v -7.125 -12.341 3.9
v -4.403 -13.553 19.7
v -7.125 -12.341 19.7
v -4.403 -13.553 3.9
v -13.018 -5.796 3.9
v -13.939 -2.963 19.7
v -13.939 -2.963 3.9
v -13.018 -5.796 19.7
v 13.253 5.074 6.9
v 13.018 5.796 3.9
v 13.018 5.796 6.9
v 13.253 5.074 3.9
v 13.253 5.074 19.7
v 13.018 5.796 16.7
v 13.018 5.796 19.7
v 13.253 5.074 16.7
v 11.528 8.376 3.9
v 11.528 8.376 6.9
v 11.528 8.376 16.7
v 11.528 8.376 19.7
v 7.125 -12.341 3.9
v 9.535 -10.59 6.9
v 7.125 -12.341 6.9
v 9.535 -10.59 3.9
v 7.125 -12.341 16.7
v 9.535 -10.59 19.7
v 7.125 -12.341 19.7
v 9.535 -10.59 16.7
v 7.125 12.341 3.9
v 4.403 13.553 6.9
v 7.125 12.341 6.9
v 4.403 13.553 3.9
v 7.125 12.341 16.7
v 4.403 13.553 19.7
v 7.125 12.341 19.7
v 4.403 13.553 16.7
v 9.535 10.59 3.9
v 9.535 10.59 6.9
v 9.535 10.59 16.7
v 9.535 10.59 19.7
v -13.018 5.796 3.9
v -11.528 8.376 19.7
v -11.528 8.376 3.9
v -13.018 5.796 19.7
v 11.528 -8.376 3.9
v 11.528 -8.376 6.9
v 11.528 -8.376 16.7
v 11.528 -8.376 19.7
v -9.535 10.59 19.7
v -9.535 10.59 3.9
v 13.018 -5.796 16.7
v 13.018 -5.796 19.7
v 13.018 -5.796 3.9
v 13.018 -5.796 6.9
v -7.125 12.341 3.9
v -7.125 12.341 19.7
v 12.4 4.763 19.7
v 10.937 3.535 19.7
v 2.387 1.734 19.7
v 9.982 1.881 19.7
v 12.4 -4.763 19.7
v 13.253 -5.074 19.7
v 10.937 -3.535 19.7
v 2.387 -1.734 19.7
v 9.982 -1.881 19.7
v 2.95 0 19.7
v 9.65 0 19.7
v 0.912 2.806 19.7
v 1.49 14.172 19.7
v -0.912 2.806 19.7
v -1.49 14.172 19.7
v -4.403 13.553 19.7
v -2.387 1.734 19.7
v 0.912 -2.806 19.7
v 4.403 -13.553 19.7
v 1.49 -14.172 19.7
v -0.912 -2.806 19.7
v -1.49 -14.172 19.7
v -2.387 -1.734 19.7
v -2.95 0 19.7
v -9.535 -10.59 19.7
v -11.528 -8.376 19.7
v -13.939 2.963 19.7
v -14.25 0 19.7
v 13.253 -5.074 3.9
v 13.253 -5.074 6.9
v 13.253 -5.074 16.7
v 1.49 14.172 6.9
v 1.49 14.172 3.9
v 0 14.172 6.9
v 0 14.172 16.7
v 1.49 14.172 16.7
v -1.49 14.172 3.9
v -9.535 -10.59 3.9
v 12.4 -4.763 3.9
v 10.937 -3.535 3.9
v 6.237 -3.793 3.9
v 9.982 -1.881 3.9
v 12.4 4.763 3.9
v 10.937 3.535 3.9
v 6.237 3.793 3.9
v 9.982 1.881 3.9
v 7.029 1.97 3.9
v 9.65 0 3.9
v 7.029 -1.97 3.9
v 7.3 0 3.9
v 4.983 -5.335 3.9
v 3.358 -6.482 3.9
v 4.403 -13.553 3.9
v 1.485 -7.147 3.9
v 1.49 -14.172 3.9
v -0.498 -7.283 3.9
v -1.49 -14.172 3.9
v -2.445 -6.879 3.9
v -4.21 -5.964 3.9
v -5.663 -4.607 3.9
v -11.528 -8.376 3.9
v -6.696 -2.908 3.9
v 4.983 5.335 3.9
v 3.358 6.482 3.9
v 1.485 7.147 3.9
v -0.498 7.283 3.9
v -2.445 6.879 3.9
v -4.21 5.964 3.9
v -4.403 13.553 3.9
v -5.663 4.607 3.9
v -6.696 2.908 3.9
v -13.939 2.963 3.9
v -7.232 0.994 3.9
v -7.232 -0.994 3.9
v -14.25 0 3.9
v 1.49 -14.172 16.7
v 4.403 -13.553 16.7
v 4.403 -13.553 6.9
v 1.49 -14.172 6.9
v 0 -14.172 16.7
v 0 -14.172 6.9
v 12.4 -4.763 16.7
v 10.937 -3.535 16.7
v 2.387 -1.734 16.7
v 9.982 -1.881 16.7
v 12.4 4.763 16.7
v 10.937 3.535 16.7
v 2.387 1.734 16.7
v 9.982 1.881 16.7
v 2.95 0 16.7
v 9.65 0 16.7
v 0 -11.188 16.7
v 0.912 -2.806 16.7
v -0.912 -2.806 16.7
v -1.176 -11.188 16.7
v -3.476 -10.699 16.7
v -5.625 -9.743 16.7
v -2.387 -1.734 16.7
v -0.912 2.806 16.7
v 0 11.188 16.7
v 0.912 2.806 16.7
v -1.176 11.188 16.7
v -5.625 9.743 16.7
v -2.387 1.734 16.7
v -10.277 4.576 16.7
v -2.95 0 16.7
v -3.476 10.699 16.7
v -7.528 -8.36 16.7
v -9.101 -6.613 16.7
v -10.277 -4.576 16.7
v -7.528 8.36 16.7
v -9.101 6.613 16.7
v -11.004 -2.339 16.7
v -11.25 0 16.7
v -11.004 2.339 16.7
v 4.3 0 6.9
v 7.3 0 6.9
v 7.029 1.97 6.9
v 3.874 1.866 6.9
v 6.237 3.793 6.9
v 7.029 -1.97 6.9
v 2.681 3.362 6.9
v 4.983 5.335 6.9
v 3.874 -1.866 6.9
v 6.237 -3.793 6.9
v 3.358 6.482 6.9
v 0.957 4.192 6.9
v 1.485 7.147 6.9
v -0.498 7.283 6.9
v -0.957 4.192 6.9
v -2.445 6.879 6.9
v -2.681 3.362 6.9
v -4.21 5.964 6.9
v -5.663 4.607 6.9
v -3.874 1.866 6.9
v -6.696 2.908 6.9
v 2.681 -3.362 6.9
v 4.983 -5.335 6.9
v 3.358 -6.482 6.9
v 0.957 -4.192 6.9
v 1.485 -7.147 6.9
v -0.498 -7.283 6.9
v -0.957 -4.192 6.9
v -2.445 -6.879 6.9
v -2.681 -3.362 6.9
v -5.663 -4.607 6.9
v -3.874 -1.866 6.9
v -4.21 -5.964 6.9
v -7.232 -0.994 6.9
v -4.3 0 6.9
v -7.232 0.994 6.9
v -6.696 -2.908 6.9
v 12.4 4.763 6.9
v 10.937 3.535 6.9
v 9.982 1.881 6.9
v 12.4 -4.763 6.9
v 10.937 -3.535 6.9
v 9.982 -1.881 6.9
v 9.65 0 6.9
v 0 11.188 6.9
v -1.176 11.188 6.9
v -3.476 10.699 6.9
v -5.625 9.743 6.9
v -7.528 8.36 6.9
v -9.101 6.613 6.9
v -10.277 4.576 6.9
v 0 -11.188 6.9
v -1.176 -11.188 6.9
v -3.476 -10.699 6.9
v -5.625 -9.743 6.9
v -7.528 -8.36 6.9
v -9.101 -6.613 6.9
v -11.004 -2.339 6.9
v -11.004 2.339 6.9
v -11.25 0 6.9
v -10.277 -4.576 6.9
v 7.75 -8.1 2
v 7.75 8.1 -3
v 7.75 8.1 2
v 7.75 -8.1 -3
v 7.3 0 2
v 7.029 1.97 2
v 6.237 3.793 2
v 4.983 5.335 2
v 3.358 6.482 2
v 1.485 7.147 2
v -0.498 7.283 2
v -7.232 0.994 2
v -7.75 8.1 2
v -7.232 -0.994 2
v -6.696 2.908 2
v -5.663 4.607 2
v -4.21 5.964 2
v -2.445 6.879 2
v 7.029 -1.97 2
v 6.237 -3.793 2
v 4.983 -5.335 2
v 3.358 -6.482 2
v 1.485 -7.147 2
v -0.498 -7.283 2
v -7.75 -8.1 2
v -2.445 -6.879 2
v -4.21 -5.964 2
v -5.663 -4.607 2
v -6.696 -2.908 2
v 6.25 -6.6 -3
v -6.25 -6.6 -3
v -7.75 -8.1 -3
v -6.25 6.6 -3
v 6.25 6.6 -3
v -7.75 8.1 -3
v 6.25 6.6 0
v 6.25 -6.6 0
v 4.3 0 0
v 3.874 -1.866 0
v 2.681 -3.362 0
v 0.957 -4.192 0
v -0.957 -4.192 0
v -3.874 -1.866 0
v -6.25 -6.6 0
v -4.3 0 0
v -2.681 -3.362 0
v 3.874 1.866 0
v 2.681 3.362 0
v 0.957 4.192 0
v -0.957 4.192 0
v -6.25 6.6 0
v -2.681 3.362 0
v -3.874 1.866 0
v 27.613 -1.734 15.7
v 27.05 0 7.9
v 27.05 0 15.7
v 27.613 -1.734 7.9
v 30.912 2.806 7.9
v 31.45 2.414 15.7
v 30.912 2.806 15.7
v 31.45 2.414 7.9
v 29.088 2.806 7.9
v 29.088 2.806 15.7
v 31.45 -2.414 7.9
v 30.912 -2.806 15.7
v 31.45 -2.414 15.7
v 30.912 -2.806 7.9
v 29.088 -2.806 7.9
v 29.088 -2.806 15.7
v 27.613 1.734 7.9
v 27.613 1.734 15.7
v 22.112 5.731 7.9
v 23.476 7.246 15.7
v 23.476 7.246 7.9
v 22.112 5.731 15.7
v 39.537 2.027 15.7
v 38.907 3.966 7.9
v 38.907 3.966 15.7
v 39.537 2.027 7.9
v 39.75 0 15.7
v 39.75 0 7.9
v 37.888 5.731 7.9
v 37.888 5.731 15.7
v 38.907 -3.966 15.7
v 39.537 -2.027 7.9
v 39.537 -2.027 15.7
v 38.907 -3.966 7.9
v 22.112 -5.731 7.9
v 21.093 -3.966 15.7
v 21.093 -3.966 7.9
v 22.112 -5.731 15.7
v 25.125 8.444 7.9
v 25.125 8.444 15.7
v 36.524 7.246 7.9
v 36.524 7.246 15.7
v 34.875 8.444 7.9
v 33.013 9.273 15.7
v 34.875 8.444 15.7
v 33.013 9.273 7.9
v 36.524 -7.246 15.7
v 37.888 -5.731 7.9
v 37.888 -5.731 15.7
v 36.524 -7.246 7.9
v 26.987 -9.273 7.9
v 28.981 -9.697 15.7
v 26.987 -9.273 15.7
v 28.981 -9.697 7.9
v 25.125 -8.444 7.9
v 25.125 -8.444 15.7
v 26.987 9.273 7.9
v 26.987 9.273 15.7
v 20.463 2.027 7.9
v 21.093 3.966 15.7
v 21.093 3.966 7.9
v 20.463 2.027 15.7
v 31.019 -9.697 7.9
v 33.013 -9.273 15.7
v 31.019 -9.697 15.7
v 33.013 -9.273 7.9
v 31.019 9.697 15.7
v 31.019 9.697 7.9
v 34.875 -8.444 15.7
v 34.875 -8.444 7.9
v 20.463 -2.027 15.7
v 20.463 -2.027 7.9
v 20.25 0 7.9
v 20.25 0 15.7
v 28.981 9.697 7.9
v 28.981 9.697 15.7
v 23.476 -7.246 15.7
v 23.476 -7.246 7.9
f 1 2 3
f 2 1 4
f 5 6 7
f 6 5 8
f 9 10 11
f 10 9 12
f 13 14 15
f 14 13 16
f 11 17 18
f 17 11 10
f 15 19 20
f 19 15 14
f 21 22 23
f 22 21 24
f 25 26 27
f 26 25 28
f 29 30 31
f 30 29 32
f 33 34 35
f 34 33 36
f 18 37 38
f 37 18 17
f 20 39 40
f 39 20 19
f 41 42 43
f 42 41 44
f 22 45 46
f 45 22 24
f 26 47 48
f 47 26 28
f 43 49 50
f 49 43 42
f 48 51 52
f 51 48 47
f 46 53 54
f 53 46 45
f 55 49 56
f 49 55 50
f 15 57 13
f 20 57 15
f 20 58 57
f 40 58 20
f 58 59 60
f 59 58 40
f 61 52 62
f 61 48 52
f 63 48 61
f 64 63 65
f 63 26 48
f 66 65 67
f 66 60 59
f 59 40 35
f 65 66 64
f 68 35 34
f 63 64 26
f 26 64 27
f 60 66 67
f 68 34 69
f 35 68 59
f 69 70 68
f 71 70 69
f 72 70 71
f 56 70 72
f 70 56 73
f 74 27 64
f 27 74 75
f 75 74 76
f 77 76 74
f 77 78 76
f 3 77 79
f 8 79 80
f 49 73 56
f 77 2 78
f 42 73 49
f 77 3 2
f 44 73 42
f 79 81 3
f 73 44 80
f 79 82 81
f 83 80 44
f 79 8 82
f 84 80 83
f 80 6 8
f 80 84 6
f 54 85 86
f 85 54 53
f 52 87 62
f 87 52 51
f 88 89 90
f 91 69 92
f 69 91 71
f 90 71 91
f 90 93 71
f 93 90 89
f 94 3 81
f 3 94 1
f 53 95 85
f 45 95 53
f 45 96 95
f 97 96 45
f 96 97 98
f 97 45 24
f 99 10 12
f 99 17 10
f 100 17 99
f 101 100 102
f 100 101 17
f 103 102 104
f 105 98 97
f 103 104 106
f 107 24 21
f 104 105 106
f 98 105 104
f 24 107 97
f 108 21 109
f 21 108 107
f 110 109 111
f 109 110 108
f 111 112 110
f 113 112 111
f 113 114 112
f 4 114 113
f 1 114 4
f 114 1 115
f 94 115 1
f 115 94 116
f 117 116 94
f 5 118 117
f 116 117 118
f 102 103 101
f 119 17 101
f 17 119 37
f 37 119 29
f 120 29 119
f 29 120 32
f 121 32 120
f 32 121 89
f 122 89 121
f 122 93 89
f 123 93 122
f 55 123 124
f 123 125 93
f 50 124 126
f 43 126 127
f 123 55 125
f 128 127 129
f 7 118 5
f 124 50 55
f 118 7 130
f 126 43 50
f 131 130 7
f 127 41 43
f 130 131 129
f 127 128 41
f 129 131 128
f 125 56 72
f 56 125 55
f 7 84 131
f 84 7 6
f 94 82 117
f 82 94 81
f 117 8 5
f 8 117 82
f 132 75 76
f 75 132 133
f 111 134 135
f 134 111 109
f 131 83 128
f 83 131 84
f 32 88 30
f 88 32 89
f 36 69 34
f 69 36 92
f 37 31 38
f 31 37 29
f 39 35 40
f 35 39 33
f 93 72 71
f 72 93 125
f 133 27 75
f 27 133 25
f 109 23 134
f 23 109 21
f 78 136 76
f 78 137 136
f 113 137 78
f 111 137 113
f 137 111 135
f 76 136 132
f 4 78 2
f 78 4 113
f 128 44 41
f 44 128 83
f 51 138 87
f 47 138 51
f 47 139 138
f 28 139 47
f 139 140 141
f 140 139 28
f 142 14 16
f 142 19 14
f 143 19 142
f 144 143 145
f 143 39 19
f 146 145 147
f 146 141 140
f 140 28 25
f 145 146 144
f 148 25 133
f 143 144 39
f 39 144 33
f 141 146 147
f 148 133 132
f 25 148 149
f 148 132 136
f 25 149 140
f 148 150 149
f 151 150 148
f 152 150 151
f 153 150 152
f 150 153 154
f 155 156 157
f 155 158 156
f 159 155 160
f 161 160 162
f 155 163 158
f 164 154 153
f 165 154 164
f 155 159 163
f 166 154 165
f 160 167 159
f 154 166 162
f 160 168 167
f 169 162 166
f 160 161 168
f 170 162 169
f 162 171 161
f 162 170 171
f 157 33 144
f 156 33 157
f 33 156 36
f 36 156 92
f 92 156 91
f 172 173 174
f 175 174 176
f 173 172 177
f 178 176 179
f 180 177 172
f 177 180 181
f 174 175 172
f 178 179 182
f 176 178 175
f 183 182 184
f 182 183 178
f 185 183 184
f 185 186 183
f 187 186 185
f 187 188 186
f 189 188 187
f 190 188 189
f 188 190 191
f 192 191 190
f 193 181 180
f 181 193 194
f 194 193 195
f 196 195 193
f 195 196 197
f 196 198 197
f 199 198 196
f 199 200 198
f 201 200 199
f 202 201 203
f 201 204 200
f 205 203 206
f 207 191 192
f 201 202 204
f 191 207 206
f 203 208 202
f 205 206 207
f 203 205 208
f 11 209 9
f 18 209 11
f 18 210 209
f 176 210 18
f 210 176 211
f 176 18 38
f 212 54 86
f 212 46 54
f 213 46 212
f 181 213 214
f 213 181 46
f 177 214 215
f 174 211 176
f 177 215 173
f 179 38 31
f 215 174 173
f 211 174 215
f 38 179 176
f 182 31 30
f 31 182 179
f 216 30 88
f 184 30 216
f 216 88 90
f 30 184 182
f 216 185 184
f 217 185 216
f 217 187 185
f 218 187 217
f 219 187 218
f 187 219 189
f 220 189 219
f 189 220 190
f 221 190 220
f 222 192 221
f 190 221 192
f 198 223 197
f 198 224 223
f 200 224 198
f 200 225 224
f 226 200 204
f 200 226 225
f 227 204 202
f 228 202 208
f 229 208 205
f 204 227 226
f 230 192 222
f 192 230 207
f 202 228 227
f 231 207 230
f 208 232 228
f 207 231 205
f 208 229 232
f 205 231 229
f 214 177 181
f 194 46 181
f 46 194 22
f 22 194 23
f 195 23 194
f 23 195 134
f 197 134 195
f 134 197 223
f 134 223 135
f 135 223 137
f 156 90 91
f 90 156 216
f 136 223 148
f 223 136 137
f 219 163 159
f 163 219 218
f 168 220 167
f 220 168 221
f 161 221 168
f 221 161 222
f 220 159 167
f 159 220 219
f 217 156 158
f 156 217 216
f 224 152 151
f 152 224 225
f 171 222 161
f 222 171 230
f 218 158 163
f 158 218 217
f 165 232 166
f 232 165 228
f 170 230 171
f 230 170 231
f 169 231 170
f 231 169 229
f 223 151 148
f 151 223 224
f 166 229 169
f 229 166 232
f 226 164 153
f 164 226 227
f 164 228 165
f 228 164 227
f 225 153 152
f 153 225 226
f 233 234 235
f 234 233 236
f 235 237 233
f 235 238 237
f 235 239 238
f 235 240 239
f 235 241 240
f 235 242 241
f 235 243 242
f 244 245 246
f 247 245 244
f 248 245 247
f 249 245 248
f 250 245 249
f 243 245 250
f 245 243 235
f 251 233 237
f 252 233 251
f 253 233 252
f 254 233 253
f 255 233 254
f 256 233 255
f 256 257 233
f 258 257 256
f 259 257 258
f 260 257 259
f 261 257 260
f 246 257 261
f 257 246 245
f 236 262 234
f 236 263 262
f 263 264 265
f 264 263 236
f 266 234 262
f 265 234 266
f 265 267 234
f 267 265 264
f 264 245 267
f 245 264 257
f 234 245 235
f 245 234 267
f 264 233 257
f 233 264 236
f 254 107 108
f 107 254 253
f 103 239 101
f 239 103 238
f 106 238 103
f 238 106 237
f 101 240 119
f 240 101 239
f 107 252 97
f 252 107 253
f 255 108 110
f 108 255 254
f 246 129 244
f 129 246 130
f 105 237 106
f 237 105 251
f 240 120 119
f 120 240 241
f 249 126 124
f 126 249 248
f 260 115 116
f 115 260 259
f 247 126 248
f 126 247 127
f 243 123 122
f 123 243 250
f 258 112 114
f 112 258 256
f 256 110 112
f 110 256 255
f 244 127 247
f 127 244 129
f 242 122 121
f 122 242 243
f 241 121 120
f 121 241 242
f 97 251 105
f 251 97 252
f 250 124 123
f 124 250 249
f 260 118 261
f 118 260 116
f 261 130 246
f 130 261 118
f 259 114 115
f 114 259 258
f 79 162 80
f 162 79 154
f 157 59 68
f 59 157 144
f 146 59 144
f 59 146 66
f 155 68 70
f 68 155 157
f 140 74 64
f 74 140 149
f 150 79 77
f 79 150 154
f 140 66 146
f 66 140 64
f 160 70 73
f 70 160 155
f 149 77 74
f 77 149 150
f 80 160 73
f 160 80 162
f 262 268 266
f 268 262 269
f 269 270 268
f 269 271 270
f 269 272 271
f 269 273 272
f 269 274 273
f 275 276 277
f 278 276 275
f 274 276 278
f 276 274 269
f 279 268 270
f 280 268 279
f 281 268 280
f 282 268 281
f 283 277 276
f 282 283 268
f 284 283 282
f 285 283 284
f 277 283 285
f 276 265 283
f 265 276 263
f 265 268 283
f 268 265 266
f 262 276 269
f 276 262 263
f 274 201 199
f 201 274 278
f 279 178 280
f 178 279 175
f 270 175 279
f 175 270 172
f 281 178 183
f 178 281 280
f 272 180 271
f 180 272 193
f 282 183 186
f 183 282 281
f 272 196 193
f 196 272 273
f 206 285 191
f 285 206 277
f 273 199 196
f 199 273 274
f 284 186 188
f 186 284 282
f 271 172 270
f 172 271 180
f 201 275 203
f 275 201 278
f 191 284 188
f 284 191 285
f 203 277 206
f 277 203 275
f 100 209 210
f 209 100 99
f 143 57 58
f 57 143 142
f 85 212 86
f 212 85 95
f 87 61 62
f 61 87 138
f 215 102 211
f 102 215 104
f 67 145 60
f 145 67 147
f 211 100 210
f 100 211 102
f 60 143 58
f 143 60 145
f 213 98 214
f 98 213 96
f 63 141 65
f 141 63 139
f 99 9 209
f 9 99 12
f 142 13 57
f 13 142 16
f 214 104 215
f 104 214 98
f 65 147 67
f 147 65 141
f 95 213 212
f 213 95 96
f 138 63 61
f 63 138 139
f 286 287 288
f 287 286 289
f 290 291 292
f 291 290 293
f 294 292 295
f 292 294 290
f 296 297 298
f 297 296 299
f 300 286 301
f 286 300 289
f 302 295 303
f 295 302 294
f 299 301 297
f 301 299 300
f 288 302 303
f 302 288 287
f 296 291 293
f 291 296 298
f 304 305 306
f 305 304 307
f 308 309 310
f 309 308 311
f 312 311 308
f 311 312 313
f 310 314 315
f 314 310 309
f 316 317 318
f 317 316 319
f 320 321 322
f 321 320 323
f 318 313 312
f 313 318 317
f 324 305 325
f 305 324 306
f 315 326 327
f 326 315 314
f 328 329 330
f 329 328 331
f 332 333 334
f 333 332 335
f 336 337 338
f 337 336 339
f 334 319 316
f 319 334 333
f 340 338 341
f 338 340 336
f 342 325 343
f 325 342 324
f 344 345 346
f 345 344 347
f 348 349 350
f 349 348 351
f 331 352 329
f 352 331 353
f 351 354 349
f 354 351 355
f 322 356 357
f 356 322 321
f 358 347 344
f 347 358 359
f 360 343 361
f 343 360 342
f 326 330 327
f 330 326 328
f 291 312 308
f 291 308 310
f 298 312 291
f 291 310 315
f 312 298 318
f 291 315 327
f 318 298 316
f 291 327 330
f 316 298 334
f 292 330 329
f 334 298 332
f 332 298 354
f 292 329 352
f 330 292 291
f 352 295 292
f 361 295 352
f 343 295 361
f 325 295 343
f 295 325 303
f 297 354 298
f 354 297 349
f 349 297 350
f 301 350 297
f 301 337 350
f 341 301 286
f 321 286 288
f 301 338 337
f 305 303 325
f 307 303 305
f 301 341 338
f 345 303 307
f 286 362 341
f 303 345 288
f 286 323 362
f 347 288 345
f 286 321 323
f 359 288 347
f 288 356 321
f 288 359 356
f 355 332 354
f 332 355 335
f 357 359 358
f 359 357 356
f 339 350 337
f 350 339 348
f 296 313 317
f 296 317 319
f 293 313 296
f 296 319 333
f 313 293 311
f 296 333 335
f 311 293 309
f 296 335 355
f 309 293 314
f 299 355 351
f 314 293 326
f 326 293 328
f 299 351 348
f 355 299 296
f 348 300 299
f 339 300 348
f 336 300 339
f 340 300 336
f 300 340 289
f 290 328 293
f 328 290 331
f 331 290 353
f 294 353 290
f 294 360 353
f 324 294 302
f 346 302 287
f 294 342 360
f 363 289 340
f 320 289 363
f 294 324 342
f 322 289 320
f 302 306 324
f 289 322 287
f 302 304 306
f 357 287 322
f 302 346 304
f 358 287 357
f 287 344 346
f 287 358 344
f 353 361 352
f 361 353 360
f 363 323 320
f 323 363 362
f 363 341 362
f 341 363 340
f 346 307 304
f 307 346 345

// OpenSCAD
pot_radius=5.90/2;
meplat = 1.5;
width=12.5;
length = 13.2;
screw_radius = 8.6/2;
pot_length = 12.8;
screw_length = 6.9;
thickness = 3;
axis_radius = 5.5;
spacing = 1.5;

wheel_radius = width/2+thickness+0.5;

module pot(mep){
translate([0,0,-1.5-1]) cube(size=[width, length, 5], center=true);
translate([0,0, -1])cylinder(r= screw_radius, h=screw_length+1);
difference(){
		translate([0,0,screw_length-1]) cylinder(r=pot_radius, h=pot_length+2);
		translate([2*pot_radius-mep,0,50+screw_length]) cube([2*pot_radius	, 100,100], center=true);
}
}

//rotate([0,-90,0])
difference(){
union(){
translate([0,0,-1.5+1]) cube(size=[width+thickness, length+thickness, 5], center=true);
cylinder(r= screw_radius+thickness, h=screw_length);
difference(){
		translate([0,0,screw_length-thickness]) cylinder(r=wheel_radius+spacing+thickness, h=pot_length+thickness);
		translate([50,0,screw_length+(pot_length-thickness)/2]) cube([100, 100,pot_length-thickness], center=true);
	
		translate([0,0,screw_length]) cylinder(r=wheel_radius+spacing, h=pot_length-thickness);
}
}
pot(0);
	translate([wheel_radius+axis_radius-0.1,0,0]) cylinder(r=axis_radius, h=100, center=true);
}




//Wheel

translate([30,0,0])
difference(){
	translate([0,0, screw_length+1]) cylinder(r=wheel_radius, h=pot_length-5);
pot(meplat);
	}
